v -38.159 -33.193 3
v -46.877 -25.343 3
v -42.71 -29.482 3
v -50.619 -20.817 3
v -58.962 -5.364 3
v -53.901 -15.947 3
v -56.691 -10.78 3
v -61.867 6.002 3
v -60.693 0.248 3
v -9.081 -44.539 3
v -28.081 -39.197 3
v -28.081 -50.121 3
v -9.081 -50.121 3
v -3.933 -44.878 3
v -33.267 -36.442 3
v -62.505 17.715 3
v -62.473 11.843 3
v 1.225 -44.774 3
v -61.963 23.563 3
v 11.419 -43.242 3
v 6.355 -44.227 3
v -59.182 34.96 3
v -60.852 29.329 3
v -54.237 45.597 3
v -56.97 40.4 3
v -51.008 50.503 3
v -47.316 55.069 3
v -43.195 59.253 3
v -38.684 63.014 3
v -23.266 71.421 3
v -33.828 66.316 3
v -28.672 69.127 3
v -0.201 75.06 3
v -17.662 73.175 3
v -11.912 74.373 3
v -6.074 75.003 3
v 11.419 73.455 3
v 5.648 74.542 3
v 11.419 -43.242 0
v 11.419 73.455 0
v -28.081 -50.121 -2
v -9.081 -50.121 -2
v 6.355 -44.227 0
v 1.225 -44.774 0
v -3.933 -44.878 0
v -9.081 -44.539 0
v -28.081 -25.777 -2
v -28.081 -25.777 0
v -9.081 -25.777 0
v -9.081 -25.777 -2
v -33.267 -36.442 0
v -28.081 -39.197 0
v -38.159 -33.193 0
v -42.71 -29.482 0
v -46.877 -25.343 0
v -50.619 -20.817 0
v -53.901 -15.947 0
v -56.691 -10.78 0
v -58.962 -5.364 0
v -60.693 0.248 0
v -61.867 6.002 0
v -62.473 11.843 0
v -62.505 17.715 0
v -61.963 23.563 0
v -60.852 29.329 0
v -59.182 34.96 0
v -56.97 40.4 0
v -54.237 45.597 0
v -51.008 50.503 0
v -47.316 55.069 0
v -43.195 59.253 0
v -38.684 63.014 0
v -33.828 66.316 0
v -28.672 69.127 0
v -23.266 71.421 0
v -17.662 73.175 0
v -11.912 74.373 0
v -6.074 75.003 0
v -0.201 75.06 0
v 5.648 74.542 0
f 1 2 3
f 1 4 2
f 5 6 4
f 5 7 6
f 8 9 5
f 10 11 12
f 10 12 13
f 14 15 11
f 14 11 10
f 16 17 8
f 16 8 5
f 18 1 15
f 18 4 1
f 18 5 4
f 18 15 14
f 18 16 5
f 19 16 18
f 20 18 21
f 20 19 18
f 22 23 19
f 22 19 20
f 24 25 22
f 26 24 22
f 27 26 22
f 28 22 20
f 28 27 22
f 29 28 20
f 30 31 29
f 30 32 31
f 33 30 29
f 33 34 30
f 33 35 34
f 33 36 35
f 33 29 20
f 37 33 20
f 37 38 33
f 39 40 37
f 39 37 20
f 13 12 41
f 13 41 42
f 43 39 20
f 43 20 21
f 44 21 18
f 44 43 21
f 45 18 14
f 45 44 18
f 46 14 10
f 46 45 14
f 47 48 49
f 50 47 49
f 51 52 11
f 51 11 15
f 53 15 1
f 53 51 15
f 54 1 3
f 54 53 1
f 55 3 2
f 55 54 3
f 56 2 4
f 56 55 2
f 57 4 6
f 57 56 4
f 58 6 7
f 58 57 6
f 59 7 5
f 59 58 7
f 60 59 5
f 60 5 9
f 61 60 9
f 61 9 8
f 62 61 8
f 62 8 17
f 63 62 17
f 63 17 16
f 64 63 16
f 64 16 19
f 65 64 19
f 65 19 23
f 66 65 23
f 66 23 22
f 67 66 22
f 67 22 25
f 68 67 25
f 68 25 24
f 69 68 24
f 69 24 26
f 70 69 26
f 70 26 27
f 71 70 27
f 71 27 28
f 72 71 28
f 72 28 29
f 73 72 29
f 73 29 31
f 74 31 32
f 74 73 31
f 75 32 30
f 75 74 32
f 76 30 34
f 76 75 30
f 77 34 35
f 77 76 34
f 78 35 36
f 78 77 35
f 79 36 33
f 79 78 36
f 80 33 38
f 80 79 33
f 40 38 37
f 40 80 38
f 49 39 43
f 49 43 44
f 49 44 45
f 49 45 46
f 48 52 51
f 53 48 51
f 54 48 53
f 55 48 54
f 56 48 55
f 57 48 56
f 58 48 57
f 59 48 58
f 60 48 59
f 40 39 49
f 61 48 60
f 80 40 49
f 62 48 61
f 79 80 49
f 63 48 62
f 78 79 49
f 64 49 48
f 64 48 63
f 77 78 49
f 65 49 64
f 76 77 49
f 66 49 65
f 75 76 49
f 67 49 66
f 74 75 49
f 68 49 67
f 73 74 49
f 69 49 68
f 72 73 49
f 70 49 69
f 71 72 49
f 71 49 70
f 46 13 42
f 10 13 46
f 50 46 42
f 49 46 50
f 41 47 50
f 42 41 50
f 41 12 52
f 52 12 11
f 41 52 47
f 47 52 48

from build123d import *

# Parameters (mm, degrees)
BOSS_EXTRUDE1_DEPTH = 3
SKETCH2_W           = 19
SKETCH2_H           = 24.344098819
BOSS_EXTRUDE2_DEPTH = 5


with BuildPart() as part:
    # Sketch1 → Boss-Extrude1 (new body)
    with BuildSketch(Plane.XY):
        with BuildLine():
            Line((11.419301697, 73.454544617), (11.419301697, -43.242123234))
            ThreePointArc((11.419301697, -43.242123234), (-62.561825873, 15.106210692), (11.419301697, 73.454544617))
        make_face()
    extrude(amount=BOSS_EXTRUDE1_DEPTH)

    # Sketch2 → Boss-Extrude2 (add)
    with BuildSketch(Plane.XY.offset(3)):
        with Locations((-18.580698303, -37.949042382)):
            Rectangle(SKETCH2_W, SKETCH2_H)
    extrude(amount=-BOSS_EXTRUDE2_DEPTH)


solid = part.part
